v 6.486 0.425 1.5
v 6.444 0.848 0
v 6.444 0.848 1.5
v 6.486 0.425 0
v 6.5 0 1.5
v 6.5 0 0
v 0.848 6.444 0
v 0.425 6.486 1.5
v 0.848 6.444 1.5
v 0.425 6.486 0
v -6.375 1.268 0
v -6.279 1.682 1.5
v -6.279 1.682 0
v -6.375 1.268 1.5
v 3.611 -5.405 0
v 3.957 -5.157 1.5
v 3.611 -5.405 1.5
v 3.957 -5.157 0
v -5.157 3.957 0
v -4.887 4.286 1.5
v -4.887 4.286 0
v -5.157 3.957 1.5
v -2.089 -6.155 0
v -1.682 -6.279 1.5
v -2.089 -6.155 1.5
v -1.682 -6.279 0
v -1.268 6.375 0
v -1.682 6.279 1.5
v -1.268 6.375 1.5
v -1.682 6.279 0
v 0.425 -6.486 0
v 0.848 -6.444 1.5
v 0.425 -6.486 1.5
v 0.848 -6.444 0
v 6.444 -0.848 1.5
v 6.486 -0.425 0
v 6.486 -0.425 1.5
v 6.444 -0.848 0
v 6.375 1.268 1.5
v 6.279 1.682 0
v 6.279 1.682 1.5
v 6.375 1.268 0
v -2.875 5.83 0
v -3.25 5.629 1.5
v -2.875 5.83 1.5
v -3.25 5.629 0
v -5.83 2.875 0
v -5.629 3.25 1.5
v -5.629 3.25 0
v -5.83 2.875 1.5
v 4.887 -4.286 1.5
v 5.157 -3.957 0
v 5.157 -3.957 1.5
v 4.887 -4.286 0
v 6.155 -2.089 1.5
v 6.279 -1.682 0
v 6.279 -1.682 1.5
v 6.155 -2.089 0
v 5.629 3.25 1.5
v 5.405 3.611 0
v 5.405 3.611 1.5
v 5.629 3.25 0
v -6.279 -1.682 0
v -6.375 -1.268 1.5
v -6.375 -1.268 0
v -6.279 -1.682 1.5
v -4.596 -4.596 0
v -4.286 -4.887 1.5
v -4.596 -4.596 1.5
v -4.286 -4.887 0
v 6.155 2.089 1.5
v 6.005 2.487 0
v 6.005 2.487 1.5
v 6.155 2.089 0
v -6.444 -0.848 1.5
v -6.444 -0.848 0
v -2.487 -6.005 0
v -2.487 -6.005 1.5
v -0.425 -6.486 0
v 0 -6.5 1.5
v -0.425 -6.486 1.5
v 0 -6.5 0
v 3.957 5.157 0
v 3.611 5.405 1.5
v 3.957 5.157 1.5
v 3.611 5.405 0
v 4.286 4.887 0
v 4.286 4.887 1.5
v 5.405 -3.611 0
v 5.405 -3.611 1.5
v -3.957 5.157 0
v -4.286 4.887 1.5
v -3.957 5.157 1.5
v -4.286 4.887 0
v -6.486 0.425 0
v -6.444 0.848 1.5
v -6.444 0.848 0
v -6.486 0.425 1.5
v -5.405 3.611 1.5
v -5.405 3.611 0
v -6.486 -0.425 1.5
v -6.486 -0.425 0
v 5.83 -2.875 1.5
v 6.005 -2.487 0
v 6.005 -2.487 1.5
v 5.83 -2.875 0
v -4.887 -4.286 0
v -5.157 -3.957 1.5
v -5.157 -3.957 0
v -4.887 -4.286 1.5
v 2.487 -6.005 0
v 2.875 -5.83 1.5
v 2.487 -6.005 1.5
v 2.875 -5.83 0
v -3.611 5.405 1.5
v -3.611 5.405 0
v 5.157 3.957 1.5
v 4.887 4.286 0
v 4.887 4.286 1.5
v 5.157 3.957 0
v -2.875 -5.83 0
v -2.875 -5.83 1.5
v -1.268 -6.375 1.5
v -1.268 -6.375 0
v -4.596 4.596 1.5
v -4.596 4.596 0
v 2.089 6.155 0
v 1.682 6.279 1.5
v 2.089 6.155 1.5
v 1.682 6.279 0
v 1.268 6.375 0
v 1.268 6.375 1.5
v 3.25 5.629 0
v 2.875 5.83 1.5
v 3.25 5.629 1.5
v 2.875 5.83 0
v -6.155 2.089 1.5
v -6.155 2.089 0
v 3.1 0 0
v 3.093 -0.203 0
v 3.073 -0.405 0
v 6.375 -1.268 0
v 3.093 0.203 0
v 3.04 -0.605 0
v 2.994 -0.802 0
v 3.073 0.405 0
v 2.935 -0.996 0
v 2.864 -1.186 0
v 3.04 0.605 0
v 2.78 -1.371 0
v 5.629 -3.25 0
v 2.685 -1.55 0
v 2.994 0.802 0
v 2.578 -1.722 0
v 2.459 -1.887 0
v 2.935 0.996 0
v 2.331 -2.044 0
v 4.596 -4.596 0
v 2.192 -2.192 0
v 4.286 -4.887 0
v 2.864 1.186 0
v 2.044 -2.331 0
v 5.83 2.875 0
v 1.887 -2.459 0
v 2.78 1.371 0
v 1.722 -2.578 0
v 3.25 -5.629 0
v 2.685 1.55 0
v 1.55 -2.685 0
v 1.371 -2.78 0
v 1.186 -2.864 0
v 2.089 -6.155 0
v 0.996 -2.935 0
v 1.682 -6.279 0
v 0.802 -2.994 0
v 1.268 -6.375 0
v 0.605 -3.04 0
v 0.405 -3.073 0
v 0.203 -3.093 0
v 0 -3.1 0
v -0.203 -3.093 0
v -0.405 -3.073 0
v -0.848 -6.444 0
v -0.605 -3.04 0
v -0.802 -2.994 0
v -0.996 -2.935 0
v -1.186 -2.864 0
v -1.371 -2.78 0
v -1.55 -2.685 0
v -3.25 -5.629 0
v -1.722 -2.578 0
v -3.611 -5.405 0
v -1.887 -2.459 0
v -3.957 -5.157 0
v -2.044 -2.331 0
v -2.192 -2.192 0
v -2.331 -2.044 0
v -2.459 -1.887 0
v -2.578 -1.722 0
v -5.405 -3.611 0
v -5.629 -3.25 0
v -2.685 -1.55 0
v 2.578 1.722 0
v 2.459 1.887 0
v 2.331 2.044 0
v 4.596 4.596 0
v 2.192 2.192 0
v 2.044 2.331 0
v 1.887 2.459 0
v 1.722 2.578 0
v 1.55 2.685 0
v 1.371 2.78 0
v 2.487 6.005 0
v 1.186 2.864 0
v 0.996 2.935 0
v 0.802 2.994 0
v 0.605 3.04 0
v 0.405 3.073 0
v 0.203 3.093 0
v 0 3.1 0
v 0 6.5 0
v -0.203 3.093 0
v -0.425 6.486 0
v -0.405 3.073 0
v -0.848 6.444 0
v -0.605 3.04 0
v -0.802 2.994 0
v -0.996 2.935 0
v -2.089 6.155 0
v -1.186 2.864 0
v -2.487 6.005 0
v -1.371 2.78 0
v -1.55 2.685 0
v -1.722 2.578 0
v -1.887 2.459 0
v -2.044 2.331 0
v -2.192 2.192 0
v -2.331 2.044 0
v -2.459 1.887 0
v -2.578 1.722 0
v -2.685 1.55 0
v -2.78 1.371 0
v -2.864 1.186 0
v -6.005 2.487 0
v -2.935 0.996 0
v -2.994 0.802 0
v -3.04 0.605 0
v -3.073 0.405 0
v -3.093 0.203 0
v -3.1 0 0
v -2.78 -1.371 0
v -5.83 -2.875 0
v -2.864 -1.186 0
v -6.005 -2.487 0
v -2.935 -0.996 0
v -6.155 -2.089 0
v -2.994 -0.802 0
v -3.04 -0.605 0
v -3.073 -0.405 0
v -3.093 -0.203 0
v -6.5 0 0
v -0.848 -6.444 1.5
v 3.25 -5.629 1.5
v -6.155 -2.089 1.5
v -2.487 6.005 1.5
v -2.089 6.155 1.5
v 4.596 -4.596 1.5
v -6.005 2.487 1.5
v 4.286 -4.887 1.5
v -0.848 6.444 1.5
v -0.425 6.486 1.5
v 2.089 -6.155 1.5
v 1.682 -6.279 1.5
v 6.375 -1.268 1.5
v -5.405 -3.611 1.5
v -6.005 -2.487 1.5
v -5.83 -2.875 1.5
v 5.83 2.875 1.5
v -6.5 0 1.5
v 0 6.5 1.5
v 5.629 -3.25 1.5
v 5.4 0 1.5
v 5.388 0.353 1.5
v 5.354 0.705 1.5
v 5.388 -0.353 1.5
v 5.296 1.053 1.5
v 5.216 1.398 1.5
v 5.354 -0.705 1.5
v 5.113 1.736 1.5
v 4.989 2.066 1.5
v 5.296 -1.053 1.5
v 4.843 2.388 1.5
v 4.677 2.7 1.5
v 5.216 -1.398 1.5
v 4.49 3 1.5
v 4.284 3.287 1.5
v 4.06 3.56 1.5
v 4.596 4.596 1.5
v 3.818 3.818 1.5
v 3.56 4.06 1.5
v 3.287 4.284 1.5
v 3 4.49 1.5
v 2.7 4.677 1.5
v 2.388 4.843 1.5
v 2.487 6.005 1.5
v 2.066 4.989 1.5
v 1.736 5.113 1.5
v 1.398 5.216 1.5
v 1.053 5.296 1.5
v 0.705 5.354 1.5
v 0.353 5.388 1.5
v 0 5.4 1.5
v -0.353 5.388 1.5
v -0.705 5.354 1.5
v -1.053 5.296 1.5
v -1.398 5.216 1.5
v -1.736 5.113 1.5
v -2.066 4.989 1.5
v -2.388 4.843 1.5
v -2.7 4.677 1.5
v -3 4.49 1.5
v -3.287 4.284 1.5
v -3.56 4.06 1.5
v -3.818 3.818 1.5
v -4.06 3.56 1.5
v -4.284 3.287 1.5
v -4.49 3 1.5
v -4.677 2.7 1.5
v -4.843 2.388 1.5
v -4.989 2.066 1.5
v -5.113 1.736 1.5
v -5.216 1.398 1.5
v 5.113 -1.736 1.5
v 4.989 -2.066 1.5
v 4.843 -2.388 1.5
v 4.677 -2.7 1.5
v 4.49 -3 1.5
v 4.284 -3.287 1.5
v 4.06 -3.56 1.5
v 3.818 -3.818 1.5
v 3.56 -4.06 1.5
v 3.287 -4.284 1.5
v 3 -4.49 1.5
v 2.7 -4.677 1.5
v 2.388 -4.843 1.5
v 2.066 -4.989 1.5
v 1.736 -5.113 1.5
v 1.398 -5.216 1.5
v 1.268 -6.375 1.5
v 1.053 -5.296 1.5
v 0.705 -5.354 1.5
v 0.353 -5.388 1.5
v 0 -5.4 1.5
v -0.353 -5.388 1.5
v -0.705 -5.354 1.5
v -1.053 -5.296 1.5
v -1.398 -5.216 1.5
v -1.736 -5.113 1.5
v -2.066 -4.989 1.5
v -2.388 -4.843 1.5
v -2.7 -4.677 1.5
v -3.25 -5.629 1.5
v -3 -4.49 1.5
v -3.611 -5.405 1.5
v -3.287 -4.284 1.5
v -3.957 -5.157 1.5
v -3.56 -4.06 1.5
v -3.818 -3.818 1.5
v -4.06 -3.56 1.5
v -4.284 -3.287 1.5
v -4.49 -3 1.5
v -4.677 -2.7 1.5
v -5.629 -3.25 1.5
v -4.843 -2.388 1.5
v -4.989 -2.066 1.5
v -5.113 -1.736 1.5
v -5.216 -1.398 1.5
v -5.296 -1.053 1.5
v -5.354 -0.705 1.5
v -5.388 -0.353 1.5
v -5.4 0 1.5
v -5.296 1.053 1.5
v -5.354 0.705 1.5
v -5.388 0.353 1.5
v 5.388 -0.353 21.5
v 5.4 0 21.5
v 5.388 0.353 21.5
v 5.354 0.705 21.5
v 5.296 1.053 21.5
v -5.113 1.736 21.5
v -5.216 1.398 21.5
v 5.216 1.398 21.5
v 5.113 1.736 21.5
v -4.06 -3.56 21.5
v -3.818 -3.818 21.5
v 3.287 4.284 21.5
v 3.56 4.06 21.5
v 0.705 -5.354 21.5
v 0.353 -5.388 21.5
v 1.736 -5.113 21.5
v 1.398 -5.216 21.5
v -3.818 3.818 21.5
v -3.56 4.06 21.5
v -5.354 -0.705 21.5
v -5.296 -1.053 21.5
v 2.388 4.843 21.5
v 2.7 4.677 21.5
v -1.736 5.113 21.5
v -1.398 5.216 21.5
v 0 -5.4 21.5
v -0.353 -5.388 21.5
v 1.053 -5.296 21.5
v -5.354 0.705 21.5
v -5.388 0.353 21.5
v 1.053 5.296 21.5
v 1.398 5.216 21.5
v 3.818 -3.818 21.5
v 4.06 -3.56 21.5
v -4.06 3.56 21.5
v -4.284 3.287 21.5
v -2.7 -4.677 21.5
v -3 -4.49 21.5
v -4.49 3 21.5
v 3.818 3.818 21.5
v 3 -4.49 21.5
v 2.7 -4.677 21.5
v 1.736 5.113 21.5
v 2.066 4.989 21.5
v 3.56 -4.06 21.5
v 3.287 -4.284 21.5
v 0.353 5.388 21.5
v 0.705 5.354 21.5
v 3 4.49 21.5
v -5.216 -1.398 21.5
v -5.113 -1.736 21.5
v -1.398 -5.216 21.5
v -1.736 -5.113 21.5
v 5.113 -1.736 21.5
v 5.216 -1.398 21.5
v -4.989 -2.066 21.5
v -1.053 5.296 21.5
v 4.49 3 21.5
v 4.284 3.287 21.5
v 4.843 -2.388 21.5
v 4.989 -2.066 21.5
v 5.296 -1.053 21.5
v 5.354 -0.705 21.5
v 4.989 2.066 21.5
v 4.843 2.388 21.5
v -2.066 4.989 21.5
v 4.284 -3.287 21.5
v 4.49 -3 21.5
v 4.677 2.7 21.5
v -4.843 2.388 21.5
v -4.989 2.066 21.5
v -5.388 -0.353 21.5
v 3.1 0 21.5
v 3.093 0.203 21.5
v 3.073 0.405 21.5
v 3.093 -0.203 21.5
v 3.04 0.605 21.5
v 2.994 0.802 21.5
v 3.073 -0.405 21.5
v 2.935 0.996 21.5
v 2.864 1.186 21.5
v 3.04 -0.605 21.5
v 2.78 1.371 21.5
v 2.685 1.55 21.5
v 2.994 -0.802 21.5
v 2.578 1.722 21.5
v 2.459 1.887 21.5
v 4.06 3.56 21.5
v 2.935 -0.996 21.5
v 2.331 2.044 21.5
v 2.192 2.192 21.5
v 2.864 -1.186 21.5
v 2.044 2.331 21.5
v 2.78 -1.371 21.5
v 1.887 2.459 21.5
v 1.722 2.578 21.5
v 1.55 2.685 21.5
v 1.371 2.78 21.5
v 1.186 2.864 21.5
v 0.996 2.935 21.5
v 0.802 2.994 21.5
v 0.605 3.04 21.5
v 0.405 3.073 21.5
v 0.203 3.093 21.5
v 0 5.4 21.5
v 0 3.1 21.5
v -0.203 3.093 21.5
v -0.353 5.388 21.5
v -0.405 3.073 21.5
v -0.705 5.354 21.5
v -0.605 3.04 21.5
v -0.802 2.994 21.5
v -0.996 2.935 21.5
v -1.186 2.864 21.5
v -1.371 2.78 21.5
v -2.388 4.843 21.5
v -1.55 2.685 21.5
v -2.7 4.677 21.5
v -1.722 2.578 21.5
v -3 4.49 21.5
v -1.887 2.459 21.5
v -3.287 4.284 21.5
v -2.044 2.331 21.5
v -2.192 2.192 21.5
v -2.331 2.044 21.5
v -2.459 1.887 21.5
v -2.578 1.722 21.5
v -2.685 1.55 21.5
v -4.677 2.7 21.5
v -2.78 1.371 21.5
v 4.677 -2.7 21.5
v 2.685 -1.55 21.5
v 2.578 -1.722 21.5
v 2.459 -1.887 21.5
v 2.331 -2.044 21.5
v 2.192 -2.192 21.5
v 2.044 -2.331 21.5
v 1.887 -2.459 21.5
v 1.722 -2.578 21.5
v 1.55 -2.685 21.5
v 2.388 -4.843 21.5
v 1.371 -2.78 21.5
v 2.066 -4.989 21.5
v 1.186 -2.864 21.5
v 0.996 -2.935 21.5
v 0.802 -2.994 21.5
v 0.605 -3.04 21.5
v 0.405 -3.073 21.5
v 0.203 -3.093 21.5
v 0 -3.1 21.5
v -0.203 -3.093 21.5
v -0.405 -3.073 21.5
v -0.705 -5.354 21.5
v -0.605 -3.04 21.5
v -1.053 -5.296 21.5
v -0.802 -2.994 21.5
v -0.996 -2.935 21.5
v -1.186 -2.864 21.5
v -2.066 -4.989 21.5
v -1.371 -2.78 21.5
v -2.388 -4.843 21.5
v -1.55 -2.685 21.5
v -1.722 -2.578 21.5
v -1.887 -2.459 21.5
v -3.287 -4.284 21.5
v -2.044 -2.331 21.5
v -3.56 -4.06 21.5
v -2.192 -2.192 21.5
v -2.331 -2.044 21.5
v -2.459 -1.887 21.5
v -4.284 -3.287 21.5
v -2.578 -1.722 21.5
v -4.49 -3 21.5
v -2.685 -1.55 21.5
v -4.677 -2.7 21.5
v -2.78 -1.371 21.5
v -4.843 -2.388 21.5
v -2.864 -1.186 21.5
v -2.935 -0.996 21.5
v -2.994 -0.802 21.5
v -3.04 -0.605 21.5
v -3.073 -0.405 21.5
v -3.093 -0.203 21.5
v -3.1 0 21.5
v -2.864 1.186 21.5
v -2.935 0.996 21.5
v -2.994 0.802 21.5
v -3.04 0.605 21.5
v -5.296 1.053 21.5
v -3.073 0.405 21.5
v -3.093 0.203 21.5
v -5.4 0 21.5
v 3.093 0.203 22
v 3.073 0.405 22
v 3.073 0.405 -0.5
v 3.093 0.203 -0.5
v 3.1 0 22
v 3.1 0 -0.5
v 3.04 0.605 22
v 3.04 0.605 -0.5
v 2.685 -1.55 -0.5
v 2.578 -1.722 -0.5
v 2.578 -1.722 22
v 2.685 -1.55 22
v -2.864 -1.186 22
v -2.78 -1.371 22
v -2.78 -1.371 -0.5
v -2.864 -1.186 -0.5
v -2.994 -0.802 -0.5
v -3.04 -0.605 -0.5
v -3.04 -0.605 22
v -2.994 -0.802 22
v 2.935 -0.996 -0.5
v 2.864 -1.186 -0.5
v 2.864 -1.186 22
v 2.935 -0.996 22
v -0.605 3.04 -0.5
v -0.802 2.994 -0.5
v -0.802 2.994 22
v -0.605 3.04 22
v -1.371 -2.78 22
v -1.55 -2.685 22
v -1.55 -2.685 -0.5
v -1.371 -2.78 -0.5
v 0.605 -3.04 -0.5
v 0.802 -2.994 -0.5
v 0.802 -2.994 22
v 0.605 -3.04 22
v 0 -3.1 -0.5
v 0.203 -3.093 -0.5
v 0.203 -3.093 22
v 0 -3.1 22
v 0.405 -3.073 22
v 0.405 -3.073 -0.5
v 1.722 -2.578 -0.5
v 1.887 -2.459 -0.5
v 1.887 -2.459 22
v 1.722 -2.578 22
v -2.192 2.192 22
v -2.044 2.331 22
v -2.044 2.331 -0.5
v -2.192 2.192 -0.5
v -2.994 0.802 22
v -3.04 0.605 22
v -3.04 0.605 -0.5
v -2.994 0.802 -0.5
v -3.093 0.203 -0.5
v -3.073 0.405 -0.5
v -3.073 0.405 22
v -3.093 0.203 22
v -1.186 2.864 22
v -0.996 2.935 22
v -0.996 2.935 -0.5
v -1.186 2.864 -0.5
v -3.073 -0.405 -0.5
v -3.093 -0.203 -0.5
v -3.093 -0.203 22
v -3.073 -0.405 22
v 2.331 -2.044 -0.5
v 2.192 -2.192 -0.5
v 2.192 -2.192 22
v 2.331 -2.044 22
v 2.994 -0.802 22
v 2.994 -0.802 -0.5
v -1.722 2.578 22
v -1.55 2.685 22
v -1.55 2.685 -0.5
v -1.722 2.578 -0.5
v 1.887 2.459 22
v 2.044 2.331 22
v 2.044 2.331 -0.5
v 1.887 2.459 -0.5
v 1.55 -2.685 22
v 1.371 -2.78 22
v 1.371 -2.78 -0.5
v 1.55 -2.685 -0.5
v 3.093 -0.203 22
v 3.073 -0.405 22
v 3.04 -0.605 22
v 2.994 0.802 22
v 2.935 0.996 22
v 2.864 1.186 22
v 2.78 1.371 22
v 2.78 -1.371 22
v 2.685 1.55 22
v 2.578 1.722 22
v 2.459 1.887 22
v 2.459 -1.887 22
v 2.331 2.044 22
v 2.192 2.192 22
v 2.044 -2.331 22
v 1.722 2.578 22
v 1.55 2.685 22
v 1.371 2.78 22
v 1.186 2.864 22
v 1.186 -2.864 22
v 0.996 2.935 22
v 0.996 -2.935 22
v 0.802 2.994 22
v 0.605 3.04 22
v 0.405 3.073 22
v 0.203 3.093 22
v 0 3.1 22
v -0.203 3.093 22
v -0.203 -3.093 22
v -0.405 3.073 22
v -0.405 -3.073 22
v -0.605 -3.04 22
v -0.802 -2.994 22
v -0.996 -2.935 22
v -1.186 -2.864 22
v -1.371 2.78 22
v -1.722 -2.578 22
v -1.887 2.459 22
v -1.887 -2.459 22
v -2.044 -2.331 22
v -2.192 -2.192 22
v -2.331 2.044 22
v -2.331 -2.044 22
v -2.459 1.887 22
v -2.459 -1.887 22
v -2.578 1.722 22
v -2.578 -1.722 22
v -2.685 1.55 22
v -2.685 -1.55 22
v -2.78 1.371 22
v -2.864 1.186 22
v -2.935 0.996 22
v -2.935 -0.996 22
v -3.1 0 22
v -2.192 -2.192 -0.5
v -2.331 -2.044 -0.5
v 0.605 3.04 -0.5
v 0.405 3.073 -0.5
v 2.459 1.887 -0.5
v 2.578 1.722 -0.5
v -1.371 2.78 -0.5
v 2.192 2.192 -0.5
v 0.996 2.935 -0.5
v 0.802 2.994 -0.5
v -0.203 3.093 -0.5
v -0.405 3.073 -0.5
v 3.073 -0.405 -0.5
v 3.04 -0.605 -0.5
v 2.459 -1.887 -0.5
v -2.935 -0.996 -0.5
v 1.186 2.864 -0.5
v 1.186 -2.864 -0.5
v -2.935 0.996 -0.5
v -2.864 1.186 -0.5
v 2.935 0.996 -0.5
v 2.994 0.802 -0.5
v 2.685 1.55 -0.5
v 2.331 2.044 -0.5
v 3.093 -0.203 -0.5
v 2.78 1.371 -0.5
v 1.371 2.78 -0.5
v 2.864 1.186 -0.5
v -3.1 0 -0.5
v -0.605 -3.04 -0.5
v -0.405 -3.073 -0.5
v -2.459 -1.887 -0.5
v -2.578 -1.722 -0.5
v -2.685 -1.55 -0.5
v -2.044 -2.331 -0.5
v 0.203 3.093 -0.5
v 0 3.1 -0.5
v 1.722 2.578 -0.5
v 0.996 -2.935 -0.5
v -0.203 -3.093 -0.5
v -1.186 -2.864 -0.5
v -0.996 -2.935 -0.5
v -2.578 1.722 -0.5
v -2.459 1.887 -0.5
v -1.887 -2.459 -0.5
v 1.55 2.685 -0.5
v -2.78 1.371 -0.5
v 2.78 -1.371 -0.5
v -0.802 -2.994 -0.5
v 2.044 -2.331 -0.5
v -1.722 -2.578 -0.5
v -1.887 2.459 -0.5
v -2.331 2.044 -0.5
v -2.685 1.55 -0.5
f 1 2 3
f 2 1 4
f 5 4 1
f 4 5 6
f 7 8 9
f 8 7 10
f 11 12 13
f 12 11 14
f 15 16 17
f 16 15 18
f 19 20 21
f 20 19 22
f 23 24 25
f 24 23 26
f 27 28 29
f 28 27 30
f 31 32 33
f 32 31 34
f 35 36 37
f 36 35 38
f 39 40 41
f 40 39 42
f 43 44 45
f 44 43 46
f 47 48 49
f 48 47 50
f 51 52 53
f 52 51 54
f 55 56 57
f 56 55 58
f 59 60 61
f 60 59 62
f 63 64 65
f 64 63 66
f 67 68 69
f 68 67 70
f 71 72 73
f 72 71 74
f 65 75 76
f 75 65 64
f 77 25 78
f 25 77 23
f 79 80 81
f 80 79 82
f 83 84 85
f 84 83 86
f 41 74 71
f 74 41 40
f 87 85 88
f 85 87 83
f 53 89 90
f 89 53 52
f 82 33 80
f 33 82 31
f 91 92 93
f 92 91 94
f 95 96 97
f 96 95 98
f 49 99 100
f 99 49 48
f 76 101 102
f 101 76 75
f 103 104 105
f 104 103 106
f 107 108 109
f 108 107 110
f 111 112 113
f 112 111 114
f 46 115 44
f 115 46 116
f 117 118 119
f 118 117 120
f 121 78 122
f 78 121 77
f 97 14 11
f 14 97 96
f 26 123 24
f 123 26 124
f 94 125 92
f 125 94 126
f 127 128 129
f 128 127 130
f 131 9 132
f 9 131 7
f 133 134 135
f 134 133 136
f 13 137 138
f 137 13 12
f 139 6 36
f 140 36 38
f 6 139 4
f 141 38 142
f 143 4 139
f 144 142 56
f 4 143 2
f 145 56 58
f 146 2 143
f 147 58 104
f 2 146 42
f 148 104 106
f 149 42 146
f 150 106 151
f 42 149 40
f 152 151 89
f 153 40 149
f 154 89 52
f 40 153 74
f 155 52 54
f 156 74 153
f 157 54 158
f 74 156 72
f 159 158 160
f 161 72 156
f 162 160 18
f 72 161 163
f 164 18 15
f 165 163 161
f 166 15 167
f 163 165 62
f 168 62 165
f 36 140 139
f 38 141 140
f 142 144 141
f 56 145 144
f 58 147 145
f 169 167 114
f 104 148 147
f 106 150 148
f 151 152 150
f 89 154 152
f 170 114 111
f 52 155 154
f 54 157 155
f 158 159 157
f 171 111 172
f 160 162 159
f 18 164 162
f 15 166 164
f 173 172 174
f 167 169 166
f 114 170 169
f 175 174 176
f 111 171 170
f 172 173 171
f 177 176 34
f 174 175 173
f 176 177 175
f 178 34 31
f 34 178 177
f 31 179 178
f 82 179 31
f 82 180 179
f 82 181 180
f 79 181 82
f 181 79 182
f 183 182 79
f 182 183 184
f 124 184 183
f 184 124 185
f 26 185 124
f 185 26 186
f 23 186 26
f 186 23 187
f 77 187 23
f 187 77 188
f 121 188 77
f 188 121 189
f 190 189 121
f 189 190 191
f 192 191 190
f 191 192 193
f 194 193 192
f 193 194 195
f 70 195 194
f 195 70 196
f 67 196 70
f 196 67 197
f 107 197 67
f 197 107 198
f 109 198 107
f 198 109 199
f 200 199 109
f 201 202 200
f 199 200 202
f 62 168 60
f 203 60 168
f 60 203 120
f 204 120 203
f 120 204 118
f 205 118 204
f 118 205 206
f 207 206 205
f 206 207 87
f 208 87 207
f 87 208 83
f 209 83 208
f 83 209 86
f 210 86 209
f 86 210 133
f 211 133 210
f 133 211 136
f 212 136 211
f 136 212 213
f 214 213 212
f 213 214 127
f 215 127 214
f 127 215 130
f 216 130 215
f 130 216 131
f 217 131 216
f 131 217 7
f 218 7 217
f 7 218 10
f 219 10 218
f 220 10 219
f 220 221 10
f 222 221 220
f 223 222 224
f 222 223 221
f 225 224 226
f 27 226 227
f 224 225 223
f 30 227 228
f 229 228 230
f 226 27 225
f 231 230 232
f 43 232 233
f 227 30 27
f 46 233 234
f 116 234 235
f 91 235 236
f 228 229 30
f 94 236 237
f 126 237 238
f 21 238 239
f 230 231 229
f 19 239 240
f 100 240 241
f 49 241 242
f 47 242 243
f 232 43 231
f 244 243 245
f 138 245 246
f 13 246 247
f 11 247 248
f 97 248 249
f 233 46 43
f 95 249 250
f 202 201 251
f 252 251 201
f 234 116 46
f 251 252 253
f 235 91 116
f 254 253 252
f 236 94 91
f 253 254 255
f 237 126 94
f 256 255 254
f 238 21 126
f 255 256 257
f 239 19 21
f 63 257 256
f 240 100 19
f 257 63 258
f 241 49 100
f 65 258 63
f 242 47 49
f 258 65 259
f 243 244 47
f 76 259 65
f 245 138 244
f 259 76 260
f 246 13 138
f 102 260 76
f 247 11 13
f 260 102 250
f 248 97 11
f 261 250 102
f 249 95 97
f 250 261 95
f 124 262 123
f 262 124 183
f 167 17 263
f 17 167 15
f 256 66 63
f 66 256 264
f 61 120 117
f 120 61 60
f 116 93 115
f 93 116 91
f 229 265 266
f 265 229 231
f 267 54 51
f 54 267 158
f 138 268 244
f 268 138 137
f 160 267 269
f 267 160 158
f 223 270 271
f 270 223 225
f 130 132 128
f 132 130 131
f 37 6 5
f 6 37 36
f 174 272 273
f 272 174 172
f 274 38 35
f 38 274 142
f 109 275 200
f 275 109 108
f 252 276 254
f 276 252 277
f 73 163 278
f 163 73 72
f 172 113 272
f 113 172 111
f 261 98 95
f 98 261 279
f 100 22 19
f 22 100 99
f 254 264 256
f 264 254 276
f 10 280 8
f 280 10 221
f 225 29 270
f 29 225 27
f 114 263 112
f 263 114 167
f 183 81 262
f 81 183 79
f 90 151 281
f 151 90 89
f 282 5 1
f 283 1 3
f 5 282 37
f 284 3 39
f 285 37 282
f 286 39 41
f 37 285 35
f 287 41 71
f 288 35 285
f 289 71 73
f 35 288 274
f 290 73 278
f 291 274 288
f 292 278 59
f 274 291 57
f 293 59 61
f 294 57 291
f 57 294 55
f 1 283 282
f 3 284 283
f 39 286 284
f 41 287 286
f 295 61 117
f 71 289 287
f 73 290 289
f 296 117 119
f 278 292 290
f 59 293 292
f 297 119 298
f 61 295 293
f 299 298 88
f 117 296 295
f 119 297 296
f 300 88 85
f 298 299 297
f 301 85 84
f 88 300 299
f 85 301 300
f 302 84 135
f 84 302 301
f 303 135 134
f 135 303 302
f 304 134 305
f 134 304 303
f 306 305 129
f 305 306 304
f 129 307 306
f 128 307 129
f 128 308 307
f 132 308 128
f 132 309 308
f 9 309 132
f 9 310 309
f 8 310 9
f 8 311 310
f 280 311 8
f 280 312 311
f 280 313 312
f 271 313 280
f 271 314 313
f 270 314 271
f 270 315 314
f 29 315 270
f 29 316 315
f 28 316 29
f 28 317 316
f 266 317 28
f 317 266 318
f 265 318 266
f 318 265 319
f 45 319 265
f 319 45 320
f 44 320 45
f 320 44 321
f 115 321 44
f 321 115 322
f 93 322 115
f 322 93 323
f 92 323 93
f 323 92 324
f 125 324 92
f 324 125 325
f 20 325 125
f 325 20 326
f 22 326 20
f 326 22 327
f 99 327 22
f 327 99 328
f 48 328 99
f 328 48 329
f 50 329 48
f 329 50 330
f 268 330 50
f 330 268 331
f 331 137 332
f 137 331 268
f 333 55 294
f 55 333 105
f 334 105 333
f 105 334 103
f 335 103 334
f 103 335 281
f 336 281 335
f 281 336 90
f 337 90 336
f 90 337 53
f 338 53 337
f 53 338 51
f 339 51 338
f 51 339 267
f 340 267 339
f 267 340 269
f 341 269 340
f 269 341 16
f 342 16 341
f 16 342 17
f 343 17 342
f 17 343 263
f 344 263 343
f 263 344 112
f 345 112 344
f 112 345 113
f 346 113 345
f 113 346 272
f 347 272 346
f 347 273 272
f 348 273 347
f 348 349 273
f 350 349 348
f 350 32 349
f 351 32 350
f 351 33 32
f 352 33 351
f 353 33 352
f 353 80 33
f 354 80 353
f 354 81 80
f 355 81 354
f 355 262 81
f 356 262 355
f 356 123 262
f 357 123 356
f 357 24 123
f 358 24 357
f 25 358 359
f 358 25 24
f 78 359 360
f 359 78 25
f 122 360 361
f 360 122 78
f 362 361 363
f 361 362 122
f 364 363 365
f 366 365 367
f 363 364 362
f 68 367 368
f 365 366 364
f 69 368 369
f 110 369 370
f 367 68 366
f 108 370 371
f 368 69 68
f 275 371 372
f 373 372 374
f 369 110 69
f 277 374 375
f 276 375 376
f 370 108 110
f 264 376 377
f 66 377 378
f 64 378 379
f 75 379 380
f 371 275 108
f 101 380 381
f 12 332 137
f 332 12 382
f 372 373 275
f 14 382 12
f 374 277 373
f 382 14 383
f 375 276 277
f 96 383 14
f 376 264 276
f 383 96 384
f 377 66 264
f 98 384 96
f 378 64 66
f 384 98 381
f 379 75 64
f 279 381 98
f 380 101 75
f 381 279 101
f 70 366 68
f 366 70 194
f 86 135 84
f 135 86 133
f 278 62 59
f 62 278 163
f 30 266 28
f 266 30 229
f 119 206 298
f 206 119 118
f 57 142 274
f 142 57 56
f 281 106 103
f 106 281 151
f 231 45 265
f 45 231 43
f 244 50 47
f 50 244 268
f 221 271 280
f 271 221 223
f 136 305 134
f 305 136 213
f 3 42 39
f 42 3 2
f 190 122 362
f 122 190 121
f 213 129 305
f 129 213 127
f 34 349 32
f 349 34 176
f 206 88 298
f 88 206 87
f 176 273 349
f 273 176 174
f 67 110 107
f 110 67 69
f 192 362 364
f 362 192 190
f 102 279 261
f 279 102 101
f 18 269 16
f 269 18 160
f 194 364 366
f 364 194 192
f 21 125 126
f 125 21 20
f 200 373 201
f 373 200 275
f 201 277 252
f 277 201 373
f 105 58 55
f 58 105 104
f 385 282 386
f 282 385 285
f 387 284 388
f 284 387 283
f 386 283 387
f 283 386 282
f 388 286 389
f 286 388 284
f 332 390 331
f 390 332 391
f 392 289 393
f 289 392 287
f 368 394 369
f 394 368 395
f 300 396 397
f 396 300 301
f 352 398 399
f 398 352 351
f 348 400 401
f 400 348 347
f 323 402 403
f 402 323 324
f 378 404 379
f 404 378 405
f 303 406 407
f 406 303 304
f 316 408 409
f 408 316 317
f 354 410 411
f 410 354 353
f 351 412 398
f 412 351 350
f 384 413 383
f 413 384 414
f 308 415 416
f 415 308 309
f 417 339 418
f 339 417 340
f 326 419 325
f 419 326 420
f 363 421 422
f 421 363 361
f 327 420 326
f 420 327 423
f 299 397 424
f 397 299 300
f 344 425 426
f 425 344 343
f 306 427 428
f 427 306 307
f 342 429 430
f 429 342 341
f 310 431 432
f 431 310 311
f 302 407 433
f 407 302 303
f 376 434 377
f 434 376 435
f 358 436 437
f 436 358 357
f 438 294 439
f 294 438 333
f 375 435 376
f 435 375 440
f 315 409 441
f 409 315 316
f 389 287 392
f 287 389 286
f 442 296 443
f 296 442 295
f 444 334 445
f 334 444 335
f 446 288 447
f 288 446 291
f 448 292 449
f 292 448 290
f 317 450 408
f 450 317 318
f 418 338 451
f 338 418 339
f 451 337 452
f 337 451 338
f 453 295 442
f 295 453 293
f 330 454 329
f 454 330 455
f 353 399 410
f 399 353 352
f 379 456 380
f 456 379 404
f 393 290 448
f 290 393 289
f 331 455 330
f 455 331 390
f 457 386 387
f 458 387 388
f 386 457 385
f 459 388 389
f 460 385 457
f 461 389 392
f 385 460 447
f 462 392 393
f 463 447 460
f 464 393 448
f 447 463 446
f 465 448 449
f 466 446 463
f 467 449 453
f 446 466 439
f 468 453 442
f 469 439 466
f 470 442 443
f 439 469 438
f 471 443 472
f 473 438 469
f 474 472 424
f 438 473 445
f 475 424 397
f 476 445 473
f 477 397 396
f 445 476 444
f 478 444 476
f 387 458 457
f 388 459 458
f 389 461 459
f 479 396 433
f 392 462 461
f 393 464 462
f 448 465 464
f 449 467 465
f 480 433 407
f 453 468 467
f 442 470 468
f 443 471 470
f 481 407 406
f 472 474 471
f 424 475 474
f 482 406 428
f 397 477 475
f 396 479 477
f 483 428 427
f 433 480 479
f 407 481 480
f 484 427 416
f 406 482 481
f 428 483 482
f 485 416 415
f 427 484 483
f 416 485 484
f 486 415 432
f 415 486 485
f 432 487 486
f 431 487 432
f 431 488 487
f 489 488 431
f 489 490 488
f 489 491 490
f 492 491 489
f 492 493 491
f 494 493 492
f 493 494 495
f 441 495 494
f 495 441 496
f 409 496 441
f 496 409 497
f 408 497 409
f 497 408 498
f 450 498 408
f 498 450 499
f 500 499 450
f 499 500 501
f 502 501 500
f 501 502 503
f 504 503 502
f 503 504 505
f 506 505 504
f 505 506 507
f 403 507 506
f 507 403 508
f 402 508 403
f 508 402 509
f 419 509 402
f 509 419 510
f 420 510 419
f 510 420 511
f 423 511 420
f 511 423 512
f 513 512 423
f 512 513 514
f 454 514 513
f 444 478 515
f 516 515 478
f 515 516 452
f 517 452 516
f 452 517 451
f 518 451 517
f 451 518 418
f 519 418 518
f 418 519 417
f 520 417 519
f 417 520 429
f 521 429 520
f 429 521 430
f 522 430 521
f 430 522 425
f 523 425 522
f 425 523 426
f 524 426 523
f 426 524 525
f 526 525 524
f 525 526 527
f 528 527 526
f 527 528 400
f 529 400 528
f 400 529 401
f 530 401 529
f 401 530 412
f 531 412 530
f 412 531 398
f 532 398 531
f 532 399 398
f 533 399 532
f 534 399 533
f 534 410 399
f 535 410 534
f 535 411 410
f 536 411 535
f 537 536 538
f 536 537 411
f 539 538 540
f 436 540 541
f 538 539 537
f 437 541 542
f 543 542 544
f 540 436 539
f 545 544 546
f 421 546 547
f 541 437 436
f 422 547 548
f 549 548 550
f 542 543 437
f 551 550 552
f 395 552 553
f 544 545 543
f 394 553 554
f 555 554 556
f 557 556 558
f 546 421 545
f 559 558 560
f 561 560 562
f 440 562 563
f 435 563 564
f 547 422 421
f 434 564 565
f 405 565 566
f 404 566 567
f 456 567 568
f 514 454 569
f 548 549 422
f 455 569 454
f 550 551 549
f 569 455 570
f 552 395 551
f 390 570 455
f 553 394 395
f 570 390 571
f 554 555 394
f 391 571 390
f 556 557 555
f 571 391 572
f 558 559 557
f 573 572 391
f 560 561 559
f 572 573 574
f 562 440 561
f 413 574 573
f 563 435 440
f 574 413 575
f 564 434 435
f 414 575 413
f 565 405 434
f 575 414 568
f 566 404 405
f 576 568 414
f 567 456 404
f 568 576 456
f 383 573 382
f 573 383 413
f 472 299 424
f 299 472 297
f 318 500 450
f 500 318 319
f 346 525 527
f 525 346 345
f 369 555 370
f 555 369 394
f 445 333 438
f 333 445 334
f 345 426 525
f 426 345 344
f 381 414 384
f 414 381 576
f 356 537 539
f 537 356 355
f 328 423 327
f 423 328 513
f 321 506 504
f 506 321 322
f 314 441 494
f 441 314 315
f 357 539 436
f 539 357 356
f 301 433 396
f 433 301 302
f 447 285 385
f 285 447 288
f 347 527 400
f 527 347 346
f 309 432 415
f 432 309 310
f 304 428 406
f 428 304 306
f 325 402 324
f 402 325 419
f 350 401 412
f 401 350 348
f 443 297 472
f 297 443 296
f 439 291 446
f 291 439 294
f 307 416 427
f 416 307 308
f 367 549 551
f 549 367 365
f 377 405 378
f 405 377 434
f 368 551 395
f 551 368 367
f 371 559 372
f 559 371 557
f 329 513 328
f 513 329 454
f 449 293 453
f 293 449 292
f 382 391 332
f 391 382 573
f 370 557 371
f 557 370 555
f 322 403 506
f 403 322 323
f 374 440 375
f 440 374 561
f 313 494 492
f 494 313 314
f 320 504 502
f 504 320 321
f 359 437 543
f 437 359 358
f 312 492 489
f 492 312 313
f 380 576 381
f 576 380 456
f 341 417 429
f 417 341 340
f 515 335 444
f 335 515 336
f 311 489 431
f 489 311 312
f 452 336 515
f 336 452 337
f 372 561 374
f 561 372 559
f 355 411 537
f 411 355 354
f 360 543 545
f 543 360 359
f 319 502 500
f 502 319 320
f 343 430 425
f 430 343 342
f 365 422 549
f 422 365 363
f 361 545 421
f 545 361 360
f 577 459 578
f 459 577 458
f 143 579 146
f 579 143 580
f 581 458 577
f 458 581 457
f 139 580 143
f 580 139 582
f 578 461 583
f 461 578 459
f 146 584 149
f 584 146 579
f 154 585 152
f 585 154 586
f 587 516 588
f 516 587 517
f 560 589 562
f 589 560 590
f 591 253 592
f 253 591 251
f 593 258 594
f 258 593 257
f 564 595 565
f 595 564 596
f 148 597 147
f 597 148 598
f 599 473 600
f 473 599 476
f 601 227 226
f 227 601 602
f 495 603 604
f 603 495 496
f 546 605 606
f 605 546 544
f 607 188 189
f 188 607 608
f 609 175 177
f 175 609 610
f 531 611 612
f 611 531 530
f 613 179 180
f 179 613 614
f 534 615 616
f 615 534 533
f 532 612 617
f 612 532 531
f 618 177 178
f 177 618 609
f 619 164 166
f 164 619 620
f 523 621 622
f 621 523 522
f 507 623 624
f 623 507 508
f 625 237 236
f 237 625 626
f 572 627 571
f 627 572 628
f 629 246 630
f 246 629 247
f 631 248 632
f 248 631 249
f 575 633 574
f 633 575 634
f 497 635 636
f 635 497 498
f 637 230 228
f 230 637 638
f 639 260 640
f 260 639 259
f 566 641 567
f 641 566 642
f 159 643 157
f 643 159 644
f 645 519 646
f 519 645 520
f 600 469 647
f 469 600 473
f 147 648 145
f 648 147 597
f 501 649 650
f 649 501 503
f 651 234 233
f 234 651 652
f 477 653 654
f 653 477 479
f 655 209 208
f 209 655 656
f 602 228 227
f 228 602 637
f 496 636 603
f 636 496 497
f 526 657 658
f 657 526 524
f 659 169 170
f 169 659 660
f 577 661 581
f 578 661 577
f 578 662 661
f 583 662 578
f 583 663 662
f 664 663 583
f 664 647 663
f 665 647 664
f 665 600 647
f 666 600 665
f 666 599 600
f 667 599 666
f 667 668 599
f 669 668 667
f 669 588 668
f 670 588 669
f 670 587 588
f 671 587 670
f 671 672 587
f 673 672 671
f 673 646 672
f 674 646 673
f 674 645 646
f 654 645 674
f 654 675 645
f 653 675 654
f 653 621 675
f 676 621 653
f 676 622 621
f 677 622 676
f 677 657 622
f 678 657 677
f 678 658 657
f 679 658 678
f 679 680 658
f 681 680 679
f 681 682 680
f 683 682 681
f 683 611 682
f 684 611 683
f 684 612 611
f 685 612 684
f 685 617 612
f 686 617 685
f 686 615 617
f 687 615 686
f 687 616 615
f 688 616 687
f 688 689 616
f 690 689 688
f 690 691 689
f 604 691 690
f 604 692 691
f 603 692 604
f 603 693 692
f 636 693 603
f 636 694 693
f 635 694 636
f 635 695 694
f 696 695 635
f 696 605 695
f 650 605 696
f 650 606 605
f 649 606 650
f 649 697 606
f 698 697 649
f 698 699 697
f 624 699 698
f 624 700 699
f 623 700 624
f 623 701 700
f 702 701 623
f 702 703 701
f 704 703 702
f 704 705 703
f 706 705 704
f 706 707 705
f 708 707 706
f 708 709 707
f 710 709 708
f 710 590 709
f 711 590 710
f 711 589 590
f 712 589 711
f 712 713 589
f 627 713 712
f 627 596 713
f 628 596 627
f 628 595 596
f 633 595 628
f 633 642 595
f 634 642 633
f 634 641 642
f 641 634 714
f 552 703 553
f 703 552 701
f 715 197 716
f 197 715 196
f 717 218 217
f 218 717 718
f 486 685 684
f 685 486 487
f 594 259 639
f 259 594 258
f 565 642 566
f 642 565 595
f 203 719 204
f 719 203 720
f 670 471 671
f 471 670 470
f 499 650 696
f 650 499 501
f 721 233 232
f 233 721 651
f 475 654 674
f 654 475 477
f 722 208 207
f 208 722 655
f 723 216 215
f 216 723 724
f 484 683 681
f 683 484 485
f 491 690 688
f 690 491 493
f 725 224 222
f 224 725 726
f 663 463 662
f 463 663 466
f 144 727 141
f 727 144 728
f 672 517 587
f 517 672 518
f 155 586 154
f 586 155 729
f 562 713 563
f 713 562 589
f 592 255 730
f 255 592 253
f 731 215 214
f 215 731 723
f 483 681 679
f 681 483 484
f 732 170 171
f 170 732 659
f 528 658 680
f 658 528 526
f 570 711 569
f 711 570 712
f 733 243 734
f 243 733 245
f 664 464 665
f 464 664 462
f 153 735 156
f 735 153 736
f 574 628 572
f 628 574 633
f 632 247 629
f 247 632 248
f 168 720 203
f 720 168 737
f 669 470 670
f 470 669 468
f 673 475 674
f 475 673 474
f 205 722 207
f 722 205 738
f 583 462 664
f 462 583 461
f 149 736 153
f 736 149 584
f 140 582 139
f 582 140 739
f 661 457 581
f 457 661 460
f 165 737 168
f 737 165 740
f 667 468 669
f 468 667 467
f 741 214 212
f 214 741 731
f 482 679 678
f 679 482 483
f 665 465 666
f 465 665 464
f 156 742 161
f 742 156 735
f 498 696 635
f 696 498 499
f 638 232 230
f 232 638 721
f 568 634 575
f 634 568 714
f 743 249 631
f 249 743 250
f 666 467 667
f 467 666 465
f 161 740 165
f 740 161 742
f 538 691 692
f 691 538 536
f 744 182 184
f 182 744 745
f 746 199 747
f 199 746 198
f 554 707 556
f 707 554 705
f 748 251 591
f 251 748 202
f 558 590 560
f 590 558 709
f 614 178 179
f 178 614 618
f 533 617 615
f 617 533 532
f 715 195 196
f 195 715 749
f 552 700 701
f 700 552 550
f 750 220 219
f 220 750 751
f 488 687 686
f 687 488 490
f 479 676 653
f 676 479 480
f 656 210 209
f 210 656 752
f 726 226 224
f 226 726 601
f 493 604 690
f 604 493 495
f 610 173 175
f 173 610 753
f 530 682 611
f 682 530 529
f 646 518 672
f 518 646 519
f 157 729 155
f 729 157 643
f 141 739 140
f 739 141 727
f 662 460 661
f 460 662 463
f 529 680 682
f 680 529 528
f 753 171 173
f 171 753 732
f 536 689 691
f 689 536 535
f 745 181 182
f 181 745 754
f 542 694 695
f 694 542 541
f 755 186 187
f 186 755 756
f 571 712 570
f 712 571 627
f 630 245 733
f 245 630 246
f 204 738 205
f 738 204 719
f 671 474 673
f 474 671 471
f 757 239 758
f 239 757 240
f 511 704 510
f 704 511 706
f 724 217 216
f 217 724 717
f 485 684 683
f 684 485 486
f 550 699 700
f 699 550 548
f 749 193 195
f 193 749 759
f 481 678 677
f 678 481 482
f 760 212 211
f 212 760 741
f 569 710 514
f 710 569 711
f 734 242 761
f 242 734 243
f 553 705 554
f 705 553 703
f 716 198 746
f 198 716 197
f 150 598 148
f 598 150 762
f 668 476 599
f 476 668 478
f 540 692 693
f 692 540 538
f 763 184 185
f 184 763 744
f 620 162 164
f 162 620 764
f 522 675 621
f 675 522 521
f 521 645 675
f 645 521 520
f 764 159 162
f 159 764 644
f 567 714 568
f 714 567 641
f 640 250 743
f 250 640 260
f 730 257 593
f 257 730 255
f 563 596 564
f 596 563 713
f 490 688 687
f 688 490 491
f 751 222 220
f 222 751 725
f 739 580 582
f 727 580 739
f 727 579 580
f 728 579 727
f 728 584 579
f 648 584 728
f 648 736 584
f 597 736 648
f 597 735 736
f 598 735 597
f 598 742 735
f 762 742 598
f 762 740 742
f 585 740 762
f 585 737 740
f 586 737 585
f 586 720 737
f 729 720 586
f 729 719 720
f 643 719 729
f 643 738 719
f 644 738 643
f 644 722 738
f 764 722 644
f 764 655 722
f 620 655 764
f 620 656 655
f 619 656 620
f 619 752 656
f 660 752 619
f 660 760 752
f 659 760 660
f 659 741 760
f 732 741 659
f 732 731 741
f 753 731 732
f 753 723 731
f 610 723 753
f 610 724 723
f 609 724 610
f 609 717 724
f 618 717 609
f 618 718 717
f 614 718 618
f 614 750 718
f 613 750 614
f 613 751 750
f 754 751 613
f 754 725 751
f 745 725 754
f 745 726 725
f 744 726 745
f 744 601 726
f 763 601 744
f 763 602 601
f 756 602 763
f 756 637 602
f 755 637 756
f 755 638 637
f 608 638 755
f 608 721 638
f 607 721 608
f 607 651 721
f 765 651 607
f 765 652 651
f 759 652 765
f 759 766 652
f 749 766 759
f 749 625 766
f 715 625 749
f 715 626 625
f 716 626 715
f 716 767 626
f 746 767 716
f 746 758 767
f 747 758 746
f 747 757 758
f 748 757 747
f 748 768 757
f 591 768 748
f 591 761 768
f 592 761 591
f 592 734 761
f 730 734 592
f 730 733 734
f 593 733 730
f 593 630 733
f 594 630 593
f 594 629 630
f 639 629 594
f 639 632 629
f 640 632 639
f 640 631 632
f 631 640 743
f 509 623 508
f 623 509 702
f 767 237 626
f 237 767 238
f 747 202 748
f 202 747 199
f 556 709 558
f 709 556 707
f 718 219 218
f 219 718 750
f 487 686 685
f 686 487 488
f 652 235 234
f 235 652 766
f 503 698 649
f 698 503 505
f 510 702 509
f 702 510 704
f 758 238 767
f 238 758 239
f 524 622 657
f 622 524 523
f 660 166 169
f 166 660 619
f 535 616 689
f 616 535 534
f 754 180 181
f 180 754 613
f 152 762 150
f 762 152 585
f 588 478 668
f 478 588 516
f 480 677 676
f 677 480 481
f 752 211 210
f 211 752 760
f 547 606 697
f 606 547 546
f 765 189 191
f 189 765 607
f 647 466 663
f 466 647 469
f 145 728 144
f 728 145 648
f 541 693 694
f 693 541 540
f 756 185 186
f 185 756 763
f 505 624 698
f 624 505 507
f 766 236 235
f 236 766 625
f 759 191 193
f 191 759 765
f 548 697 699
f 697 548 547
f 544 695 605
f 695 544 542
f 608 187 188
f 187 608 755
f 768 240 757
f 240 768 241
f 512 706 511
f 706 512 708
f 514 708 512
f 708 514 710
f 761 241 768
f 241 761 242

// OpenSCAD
// PCR tube adapter sleeve - print upside down
// Units: mm

// ---- Dimensions ----
collar_d        = 13;    // collar outer diameter
collar_t        = 1.5;   // collar thickness (z = 0 to 1.5)
sleeve_od       = 10.8;  // sleeve outer diameter
sleeve_h        = 20;    // sleeve body height above collar (z = 1.5 to 21.5)
bore_d          = 6.2;   // through-bore diameter
eps             = 0.5;   // cutter overshoot past faces

$fn = 96;

// ---- Model ----
union() {
    // Collar on the bed
    cylinder(d = collar_d, h = collar_t);

    // Sleeve body rising from the collar
    translate([0, 0, collar_t])
        cylinder(d = sleeve_od, h = sleeve_h);
}

// Full-height bore, open at both ends
translate([0, 0, -eps])
    cylinder(d = bore_d, h = collar_t + sleeve_h + 2 * eps);
